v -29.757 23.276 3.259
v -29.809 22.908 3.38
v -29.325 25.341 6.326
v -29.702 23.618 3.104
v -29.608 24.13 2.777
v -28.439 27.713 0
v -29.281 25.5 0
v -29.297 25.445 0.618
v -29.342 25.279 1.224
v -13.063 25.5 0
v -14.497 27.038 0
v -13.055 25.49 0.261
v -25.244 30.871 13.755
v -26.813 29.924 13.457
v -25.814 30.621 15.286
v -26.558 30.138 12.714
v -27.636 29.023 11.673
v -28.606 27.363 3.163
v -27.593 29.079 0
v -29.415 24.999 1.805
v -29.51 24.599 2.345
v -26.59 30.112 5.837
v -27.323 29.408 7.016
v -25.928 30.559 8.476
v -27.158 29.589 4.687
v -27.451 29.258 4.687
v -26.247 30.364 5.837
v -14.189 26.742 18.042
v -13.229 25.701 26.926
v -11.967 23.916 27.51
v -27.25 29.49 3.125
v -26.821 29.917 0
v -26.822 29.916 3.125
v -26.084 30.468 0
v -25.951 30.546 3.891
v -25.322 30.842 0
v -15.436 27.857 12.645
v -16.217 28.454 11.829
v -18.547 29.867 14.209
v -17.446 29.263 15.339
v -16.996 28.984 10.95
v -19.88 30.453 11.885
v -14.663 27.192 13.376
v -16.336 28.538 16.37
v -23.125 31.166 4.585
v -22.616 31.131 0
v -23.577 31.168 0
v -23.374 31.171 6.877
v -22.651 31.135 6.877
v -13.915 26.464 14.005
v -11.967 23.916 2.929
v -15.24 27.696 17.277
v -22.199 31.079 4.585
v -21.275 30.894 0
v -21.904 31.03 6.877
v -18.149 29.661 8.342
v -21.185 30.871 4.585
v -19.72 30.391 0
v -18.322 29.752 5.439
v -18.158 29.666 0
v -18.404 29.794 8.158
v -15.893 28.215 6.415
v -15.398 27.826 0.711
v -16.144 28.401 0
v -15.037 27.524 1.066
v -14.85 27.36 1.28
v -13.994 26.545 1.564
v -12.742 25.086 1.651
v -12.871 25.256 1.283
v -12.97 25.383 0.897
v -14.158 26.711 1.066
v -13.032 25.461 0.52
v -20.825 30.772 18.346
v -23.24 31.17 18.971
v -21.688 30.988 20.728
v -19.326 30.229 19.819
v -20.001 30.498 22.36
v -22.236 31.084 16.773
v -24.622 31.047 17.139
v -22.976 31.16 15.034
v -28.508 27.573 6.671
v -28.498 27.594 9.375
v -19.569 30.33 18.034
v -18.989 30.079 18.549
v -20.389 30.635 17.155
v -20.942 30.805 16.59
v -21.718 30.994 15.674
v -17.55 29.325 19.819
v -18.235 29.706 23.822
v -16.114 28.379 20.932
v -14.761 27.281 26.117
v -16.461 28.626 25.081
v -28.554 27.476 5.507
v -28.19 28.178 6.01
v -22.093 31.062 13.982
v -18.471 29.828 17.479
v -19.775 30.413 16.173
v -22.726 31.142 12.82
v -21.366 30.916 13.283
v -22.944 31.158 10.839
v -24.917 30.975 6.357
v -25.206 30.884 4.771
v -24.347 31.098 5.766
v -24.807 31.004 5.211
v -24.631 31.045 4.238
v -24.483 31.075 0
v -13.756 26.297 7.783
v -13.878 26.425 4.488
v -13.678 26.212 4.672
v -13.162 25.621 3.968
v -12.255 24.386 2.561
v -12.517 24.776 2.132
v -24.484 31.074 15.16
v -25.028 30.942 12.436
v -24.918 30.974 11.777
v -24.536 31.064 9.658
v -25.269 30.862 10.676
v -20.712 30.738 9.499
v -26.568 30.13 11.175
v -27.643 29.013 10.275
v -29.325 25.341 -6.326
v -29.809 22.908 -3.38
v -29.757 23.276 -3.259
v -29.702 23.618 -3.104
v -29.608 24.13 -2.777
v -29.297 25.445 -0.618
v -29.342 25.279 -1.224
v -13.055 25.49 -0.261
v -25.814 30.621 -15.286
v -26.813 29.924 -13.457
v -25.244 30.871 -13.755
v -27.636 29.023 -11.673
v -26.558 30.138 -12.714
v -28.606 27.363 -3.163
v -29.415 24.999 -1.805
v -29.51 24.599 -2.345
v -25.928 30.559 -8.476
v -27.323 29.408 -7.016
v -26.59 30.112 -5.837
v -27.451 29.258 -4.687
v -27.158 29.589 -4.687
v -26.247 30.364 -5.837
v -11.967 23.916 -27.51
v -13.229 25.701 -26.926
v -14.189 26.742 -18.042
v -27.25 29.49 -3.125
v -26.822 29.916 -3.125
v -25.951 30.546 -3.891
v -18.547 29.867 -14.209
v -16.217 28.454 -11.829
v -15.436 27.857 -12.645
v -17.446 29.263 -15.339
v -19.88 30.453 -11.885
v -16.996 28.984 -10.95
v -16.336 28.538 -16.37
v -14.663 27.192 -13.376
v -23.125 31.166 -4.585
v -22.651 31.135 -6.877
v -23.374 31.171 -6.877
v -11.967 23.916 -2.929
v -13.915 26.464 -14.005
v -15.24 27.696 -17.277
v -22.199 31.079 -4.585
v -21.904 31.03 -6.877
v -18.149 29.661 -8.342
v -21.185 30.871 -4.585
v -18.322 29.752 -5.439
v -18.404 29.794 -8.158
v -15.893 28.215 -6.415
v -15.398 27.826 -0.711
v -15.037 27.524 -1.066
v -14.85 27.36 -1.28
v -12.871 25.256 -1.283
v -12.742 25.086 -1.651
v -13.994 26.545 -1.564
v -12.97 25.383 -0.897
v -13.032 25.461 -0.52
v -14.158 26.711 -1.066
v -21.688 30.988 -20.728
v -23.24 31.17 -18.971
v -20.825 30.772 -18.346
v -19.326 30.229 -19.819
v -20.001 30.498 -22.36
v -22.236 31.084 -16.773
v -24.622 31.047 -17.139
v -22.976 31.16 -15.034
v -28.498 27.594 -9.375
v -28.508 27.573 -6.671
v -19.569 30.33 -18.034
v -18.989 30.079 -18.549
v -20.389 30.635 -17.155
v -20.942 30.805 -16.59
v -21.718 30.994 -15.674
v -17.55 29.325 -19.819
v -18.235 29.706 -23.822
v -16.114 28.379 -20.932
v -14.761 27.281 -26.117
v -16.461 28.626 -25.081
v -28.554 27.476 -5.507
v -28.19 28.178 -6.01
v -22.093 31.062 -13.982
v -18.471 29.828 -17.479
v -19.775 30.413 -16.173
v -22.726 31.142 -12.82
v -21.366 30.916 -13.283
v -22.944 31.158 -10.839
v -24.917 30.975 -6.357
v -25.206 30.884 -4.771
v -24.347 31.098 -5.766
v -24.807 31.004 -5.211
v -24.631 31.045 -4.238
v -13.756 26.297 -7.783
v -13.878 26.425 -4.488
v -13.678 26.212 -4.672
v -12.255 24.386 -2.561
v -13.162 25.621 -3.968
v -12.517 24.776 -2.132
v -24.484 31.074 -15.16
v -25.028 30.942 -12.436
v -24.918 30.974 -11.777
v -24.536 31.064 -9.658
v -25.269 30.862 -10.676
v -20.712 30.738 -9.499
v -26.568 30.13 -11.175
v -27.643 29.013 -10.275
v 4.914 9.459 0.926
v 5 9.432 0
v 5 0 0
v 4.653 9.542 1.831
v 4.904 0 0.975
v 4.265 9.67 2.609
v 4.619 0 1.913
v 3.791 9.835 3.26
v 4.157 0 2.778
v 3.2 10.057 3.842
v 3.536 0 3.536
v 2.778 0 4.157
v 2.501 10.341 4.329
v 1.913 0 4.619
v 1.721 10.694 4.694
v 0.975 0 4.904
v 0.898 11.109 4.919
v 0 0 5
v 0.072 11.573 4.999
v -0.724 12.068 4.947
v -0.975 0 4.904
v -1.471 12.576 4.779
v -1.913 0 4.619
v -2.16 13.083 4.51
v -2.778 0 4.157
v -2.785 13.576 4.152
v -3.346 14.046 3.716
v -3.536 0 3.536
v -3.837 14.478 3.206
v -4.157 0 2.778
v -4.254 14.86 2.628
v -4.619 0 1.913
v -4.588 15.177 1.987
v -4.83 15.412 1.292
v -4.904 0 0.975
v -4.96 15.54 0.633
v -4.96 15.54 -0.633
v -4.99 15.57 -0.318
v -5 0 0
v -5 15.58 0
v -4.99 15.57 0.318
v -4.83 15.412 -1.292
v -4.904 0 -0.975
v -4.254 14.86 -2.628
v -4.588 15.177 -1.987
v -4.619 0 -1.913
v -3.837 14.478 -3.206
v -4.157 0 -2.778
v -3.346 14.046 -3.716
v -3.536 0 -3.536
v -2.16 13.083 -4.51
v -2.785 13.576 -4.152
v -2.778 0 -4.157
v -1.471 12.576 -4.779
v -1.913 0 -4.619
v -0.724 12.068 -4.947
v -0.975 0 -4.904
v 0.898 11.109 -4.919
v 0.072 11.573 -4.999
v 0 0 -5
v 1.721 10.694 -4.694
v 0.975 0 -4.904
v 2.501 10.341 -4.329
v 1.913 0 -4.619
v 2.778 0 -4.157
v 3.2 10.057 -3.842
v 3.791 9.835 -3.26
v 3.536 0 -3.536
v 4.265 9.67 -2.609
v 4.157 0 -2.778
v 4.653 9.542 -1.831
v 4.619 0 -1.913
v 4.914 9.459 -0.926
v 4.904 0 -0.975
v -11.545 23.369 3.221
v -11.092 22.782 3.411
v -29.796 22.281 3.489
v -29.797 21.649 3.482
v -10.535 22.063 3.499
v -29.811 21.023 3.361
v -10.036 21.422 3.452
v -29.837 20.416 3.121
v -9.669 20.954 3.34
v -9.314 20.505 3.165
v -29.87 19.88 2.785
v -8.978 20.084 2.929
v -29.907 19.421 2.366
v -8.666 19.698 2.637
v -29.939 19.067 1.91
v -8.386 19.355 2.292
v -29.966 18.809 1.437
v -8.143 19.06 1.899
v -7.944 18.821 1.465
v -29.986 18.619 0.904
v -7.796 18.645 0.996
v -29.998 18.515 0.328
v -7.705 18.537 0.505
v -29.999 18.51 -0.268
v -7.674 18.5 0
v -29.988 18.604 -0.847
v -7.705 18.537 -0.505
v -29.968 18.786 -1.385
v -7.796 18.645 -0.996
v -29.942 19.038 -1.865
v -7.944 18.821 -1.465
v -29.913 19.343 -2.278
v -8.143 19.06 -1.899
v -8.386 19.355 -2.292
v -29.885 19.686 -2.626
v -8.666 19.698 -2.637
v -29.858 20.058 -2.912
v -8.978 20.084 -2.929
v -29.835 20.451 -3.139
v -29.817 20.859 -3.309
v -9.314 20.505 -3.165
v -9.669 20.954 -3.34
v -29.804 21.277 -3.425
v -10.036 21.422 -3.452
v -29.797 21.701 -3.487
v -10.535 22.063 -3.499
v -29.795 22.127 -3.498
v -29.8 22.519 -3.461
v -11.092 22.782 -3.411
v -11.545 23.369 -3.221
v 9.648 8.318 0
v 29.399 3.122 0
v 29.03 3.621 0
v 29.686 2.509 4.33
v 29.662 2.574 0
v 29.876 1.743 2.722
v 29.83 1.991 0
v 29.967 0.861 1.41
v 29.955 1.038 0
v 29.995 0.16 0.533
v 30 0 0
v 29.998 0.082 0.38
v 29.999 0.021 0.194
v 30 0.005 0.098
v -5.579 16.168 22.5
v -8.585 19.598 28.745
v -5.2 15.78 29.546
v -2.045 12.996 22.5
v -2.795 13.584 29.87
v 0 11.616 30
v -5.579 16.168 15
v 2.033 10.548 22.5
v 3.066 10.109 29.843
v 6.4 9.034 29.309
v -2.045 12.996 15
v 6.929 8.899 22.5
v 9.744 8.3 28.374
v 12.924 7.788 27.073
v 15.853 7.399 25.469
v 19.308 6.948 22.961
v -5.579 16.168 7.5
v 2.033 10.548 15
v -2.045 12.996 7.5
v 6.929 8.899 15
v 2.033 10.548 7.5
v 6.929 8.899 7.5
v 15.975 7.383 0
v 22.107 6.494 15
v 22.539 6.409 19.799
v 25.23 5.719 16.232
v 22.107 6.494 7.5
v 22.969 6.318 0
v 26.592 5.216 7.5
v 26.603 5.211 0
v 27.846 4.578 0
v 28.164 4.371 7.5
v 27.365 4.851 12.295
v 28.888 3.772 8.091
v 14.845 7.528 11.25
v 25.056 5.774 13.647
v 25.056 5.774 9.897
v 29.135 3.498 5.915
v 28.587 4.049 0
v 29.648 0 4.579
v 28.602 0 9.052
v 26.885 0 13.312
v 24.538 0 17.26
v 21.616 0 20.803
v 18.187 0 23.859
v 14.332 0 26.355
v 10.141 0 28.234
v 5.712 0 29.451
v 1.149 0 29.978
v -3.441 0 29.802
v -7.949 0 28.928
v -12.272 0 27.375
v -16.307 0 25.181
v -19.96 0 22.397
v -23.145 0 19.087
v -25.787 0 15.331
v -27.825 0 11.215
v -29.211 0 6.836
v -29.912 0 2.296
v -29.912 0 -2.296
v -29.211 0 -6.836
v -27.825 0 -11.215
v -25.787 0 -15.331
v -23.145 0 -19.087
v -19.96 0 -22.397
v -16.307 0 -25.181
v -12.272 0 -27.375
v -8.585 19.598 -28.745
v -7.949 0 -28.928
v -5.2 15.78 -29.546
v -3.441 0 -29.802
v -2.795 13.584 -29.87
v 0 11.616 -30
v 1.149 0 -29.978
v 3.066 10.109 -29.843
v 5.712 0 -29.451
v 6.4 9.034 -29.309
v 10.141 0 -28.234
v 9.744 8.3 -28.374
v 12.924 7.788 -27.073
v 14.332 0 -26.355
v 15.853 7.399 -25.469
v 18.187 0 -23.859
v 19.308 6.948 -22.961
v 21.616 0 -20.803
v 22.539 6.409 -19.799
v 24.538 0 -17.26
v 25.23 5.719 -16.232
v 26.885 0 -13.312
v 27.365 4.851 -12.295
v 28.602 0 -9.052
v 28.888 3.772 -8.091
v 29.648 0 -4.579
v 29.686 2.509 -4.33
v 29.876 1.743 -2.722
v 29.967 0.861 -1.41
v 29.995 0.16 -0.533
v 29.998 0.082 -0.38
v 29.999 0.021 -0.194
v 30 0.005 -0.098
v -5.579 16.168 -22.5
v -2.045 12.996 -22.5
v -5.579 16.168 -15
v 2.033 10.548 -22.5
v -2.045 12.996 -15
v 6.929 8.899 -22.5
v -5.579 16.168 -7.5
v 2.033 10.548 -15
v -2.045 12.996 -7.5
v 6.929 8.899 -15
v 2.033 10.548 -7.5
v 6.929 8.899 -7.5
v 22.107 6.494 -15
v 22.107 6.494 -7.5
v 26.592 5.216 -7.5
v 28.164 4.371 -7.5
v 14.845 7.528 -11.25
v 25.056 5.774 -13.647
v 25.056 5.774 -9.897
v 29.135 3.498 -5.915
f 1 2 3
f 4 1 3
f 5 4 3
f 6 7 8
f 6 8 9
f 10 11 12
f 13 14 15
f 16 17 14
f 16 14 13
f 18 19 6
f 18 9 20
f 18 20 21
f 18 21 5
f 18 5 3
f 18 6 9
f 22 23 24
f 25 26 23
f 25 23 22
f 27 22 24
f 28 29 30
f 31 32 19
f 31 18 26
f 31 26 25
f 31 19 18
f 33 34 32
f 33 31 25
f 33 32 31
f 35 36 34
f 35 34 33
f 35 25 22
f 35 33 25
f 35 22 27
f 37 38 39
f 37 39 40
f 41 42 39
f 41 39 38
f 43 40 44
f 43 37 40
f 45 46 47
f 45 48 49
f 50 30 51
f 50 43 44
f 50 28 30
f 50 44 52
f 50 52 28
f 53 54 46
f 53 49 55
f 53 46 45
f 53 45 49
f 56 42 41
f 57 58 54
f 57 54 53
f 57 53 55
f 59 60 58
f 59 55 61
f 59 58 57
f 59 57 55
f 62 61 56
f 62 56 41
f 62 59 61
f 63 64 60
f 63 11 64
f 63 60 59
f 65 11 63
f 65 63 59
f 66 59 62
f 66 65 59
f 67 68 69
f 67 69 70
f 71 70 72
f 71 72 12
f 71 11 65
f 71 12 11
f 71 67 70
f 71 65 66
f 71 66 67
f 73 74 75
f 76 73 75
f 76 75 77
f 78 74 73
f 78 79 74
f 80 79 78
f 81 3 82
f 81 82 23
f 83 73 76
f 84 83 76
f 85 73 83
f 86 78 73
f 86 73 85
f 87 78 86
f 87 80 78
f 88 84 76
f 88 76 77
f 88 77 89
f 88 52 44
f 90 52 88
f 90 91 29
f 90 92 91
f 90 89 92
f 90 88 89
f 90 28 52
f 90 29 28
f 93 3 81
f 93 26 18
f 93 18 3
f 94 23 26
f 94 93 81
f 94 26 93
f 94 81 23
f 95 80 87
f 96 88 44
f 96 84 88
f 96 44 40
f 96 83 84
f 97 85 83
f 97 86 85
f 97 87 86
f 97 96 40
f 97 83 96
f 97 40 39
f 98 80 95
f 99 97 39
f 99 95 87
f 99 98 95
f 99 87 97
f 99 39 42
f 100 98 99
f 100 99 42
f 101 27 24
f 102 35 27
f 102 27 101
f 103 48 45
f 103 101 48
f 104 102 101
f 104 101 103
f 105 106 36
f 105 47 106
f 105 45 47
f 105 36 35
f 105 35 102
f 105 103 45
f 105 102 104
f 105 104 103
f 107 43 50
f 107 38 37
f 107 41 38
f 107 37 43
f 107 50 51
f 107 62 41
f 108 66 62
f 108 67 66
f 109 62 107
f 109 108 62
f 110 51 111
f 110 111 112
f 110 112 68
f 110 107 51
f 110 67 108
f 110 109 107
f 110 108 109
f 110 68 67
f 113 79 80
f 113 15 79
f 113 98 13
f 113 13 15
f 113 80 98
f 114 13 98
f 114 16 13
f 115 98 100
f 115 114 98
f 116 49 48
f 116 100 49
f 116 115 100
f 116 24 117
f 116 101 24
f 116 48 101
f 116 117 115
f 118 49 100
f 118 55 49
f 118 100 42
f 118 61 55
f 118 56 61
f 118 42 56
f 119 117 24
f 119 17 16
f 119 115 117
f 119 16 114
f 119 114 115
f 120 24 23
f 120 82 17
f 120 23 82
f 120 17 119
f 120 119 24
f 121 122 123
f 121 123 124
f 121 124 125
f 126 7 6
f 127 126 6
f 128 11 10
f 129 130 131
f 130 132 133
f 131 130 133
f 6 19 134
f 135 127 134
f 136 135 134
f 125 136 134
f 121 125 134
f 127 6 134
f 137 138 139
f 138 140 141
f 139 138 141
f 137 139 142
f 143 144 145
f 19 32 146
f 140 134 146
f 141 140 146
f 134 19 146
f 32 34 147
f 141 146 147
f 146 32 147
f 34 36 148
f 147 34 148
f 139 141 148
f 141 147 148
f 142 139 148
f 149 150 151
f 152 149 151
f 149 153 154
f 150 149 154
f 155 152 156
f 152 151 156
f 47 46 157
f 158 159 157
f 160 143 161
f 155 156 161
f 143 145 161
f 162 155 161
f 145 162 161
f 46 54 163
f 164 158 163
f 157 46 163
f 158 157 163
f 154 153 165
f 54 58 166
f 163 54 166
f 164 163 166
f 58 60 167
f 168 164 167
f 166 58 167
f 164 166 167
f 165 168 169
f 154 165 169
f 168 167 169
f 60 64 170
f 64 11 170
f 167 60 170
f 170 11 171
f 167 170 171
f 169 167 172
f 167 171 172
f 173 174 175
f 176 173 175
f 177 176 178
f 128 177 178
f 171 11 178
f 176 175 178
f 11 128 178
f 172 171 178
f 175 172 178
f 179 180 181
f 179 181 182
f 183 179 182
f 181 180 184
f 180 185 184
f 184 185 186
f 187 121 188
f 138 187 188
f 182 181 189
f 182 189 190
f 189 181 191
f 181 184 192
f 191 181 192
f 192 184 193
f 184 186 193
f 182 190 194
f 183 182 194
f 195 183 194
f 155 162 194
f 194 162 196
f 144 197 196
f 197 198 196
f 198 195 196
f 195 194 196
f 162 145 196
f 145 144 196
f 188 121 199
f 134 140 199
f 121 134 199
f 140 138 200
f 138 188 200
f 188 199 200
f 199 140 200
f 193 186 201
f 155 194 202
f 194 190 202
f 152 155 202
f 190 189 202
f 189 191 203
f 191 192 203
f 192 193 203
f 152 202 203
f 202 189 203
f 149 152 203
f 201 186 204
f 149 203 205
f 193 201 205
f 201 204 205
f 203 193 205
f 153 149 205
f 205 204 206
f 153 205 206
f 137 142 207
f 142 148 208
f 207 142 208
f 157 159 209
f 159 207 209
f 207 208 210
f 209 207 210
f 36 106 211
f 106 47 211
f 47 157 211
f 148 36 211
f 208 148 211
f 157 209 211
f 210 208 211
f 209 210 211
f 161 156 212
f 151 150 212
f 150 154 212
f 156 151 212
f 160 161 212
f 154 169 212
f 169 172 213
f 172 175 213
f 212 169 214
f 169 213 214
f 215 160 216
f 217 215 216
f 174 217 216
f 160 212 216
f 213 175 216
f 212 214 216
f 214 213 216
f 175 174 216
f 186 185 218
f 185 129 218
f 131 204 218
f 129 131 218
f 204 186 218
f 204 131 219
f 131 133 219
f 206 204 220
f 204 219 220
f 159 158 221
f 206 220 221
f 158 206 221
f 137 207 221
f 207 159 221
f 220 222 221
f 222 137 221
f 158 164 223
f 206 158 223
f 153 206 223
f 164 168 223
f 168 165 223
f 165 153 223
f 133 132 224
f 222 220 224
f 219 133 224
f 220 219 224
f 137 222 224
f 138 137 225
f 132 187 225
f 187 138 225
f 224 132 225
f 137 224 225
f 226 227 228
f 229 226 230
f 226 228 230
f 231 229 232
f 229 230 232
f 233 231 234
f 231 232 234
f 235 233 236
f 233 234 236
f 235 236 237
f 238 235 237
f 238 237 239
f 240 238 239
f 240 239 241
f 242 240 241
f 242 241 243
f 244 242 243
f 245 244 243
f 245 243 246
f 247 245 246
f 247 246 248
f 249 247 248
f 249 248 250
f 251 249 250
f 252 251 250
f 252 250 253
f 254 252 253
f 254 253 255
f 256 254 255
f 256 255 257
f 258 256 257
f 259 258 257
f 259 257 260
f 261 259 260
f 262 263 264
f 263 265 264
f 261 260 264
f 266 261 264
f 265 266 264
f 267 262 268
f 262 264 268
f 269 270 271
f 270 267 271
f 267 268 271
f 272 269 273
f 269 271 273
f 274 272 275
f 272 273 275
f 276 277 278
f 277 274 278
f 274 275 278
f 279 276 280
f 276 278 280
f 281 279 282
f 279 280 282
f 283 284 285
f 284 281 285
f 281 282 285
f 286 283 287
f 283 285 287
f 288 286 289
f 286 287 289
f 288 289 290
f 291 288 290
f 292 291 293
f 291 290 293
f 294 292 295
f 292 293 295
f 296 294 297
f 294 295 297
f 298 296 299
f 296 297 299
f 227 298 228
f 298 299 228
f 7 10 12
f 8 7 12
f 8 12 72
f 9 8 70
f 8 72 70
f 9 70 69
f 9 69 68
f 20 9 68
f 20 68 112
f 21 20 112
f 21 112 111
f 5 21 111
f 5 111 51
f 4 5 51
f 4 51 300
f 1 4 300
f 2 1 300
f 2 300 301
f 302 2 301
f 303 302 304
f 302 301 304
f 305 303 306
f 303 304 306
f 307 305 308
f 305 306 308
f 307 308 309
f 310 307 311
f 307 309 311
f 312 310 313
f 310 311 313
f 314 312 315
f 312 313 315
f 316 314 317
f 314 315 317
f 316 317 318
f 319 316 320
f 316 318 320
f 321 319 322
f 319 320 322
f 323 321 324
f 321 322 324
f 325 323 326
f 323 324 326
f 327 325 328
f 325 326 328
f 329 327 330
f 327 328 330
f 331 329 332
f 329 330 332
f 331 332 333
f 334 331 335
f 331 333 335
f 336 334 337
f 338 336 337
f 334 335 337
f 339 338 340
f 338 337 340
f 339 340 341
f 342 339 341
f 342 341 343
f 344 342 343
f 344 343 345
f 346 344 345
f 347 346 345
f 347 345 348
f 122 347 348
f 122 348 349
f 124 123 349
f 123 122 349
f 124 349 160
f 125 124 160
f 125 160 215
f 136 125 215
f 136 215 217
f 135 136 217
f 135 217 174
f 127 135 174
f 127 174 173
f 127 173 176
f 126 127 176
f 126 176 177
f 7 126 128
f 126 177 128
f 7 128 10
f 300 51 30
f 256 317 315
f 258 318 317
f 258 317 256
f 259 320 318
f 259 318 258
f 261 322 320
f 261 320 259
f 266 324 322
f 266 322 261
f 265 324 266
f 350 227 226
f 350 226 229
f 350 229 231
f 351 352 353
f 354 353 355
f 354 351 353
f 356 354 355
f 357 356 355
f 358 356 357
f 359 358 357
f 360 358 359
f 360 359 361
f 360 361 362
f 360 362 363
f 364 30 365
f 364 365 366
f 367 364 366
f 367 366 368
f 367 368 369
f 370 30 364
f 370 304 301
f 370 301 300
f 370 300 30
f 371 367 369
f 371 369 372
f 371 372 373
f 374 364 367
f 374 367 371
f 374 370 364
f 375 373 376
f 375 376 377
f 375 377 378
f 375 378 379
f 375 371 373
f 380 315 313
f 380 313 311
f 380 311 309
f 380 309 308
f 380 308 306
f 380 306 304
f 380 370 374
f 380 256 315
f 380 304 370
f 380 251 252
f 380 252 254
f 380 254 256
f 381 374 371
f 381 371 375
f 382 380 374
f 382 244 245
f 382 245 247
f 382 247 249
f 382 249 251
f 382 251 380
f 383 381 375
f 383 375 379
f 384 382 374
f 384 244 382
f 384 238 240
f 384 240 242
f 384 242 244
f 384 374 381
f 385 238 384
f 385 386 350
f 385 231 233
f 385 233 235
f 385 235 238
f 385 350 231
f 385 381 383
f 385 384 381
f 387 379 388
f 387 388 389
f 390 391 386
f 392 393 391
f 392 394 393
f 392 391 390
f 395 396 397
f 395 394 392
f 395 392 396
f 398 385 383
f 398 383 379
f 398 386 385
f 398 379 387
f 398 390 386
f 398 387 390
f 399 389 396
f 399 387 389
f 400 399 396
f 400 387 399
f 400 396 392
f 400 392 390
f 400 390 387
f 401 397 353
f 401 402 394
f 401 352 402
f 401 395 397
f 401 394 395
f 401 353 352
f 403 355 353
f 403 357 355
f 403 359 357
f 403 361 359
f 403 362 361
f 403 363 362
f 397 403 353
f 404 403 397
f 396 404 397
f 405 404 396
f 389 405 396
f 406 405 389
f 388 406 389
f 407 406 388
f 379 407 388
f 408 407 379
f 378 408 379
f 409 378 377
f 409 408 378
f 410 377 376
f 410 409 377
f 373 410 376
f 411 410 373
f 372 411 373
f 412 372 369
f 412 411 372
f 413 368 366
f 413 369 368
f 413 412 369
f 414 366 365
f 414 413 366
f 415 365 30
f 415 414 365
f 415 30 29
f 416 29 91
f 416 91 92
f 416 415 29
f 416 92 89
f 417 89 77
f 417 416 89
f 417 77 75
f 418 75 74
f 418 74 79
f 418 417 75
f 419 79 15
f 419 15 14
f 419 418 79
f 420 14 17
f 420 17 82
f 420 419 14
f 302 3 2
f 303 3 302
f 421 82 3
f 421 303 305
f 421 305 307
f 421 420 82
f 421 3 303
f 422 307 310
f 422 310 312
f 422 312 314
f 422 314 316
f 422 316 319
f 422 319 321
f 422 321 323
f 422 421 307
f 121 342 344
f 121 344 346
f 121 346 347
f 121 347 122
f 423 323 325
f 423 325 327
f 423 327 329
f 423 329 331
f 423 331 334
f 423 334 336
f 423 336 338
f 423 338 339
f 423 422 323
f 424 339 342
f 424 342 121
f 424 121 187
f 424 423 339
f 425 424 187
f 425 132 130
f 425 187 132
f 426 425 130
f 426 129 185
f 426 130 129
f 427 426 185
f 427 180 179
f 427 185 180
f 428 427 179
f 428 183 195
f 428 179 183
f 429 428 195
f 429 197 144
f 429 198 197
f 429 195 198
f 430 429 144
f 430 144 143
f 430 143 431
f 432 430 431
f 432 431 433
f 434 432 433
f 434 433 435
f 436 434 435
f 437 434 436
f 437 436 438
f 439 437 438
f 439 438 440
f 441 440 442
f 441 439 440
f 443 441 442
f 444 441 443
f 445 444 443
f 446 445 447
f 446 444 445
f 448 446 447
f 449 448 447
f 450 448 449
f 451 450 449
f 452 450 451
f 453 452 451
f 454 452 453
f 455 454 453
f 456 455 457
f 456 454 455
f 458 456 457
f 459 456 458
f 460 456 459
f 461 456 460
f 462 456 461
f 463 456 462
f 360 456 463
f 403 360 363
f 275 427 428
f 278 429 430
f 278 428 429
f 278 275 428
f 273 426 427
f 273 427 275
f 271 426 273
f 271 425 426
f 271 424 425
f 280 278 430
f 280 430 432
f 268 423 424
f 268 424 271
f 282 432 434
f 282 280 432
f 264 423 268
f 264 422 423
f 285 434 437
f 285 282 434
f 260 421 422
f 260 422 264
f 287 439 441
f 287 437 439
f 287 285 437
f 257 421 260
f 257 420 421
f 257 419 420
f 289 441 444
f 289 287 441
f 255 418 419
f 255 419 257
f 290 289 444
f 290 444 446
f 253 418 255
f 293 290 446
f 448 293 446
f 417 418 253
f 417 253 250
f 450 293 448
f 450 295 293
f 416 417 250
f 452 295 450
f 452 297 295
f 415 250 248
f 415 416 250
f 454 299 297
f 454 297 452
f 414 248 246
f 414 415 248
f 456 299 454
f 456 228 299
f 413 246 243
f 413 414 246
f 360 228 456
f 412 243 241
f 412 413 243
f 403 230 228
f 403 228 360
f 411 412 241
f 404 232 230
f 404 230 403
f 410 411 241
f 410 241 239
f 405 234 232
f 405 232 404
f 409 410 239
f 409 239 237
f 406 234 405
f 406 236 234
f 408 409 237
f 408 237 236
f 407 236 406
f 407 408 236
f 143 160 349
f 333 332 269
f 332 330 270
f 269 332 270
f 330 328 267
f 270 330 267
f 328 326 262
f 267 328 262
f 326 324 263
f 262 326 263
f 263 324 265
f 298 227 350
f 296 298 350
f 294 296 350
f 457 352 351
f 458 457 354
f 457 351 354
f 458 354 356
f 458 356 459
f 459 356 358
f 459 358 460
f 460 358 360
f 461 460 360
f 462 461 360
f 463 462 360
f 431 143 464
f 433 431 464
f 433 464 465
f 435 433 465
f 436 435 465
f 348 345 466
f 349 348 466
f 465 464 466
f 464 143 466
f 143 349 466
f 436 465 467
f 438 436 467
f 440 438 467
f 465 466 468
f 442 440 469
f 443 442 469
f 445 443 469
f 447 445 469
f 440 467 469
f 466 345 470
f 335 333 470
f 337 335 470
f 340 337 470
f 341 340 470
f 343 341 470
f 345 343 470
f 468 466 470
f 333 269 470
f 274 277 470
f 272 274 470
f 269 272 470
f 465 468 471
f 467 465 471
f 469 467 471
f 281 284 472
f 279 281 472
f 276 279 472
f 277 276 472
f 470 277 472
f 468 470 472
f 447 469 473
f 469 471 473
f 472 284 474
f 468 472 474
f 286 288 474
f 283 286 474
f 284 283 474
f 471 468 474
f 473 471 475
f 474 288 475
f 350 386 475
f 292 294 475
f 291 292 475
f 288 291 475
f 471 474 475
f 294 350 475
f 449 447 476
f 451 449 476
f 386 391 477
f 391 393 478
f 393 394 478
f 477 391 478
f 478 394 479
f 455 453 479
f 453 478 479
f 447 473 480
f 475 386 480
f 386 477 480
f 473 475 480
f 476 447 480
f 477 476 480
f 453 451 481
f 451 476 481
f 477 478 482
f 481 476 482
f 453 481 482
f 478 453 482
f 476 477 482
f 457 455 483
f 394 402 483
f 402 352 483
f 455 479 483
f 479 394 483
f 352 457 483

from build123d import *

# Parameters (mm, degrees)
F2_DEPTH = 30
F0_R     = 30
F3_DEPTH = 42.6
F4_R     = 5
F5_DEPTH = 25
F6_R     = 3.5
F7_DEPTH = 30


with BuildPart() as f2:
    # F1 (on Top) → F2 (new body, symmetric)
    with BuildSketch(Plane.XY):
        with BuildLine():
            Line((-30, 20), (-30, 0))
            Line((-30, 0), (30, 0))
            add(Edge.make_bspline(
                [(-11.9669232517, 23.9158645272), (-7.6923151604, 18.383000577), (0.0553950067, 7.9561946526), (21.492198658, 7.4765338225), (29.8760138515, 4.1160909055), (29.9615187291, 1.3138395604), (30, 0)],
                knots=[0, 0, 0, 0, 0.3240993857, 0.657453389, 0.8627722962, 1, 1, 1, 1], degree=3))
            add(Edge.make_bspline(
                [(-30, 20), (-30, 24.3235133941), (-27.2825003911, 35.5783617991), (-14.6559835243, 28.5594591932), (-11.9669232517, 23.9158645272)],
                knots=[0, 0, 0, 0, 0.4708239219, 1, 1, 1, 1], degree=3))
        make_face()
    extrude(amount=F2_DEPTH, both=True)

    # F0 (on Front) → F3 (intersect)
    with BuildSketch(Plane.XZ):
        Circle(F0_R)
    extrude(amount=-F3_DEPTH, mode=Mode.INTERSECT)

    # F4 (on Front) → F5 (cut)
    with BuildSketch(Plane.XZ):
        Circle(F4_R)
    extrude(amount=-F5_DEPTH, mode=Mode.SUBTRACT)

    # F6 (on Right) → F7 (cut)
    with BuildSketch(Plane.YZ):
        with Locations((22, 0)):
            Circle(F6_R)
    extrude(amount=-F7_DEPTH, mode=Mode.SUBTRACT)


solid = f2.part
